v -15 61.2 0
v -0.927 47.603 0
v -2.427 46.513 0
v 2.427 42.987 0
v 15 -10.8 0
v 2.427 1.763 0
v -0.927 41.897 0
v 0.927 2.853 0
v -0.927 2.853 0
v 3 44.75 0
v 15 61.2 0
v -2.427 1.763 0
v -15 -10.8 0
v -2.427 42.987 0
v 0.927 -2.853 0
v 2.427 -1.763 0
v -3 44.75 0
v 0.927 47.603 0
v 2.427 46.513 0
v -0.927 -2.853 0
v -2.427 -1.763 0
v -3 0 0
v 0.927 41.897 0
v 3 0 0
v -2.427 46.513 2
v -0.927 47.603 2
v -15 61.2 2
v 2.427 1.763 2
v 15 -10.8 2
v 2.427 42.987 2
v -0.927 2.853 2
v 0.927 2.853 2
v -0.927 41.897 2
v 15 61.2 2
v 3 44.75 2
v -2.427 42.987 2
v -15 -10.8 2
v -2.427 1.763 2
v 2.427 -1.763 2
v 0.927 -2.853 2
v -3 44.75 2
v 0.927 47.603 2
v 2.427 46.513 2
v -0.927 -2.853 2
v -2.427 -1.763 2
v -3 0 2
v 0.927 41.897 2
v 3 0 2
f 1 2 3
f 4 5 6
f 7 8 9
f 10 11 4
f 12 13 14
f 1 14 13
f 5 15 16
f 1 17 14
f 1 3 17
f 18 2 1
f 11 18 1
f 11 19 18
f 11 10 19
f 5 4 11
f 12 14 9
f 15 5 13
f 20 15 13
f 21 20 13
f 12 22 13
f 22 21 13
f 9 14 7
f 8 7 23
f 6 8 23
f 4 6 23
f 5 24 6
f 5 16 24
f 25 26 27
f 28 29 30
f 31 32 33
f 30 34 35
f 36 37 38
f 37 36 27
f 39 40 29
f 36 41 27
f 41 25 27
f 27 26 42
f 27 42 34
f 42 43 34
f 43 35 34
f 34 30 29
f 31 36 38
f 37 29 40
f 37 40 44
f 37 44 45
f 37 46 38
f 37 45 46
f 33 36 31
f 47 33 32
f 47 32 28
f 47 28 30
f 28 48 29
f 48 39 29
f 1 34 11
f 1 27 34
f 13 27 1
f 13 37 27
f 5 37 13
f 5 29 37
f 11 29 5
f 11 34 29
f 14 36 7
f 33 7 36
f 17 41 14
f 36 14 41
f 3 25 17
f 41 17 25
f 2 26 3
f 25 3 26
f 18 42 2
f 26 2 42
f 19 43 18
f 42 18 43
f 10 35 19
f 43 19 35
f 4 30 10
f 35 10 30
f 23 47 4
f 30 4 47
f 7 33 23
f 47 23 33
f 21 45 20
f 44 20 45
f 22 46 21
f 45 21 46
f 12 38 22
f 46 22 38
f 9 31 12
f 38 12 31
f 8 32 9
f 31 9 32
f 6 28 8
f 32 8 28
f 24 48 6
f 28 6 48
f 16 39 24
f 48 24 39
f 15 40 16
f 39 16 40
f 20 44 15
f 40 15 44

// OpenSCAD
// file: rear_standard_tilt_slot.scad
include <../../constants.scad>

module rear_standard_tilt_slot(additional_slot_width = 0) {
    working_slot_width = rear_standard_tilt_slot_width + additional_slot_width;  
    theta = (rear_standard_tilt_slot_range) / 2;
    H = rear_standard_tilt_slot_radius + (working_slot_width / 2);
    triangle_half_width = H * tan(theta);

    rotate(a =  rear_standard_tilt_slot_rotational_offset, v = [0,0,1]) 
    intersection() {
        polygon(points = [
            [0,0],
            [H,triangle_half_width],
            [H,-triangle_half_width]
            ]);
        //slot ring
        difference() {
            circle(r = rear_standard_tilt_slot_radius + working_slot_width / 2);
            circle(r = rear_standard_tilt_slot_radius - working_slot_width / 2);
        }
    }
    rotate(a = rear_standard_tilt_slot_range / 2 + rear_standard_tilt_slot_rotational_offset, v = [0,0,1]) {
        translate(v = [H - working_slot_width / 2,0,0]) {
            circle(r = working_slot_width / 2);
        }
    }
    rotate(a = -rear_standard_tilt_slot_range / 2 + rear_standard_tilt_slot_rotational_offset, v = [0,0,1]) {
        translate(v = [H - working_slot_width / 2,0,0]) {
            circle(r = working_slot_width / 2);
        }
    }
}

rear_standard_tilt_slot();
// file: ../../constants.scad
/********************
* Table of Contents *
* *******************/
// 1. Materials
// 2. Rear Standard
    // 2.1 Rear Standard Carrier
    // 2.2 Rear Standard Housing
    // 2.3 Rear Standard Tilt Plate
    // 2.4 Rear Standard Rise Plate
// 3. Front Standard
// 4. Base
// 5. Ground Glass
// 6. Film Cassette
// 7. Movements



/****************
* 1. Materials  *
* **************/
    sheet_metal_thickness_structural = 3;
    sheet_metal_thickness_nonstructural = 2;
    screw_hole_metric_3 = 3;
    screw_hole_metric_4 = 4;
    screw_hole_metric_5 = 5;
    screw_hole_metric_6 = 6;

/********************
* 2. Rear Standard  *
* *******************/

    // 2.1 Rear Standard Carrier
    rear_standard_carrier_thickness = sheet_metal_thickness_structural;
    rear_standard_carrier_width = 30;
    rear_standard_carrier_base_length = 258.5;
    rear_standard_carrier_base_ear_length = 40;
    rear_standard_carrier_base_slot_length = 160;
    rear_standard_carrier_base_slot_width = 6;
    rear_standard_carrier_upright_length = 149;
    rear_standard_carrier_upright_slot_width = 6;
    rear_standard_carrier_screw_hole_diameter = screw_hole_metric_4;
    rear_standard_carrier_screw_hole_triangle_side_length = (rear_standard_carrier_width / 3) + rear_standard_carrier_screw_hole_diameter;
    rear_standard_carrier_screw_hole_triangle_height = (rear_standard_carrier_screw_hole_triangle_side_length * sqrt(3)) / 2;
    rear_standard_carrier_screw_hole_triangle_top_margin = 5;

    // 2.2 Rear Standard Housing
    rear_standard_housing_width = 245;
    rear_standard_housing_height = 126;
    rear_standard_housing_depth = 30;
    rear_standard_housing_thickness = 10;
    rear_standard_housing_frame_width = 33;
    rear_standard_housing_tilt_slot_additional_width = 2; // screw head diameter + small margin - rear_standard_tilt_slot_width


    // 2.3 Rear Standard Tilt Plate
    rear_standard_tilt_plate_thickness = sheet_metal_thickness_nonstructural;
    rear_standard_tilt_slot_radius = 45;
    rear_standard_tilt_slot_width = 5;
    rear_standard_tilt_slot_range = 50;
    rear_standard_tilt_slot_rotational_offset = 5;

    // 2.4 Rear Standard Rise Plate
    rear_standard_pivot_stud_diameter = 4;

/****************
* 7. Movements  *
* **************/
    rear_standard_rise_zero_pos = 29.5;
    rear_standard_rise = 0;
// main file
include <../../constants.scad>
use <./rear_standard_tilt_slot.scad>

module rear_standard_tilt_plate() {
    linear_extrude(height = rear_standard_tilt_plate_thickness) 
    difference() {
        // base shape
        slot_outline_thickness = 3;
        translate(v = [0,rear_standard_housing_height / 5,0]) {
            square(size = [rear_standard_housing_depth,rear_standard_housing_height / 1.75], center = true);
        }
        // hole for pivot stud
        circle(r = (rear_standard_pivot_stud_diameter / 2) + 1);

        // hole for tilt lock screw
        translate(v = [0,rear_standard_tilt_slot_radius - .25,0]) {
            circle(r = (rear_standard_pivot_stud_diameter / 2) + 1);
        } 
    }
}

rear_standard_tilt_plate();
